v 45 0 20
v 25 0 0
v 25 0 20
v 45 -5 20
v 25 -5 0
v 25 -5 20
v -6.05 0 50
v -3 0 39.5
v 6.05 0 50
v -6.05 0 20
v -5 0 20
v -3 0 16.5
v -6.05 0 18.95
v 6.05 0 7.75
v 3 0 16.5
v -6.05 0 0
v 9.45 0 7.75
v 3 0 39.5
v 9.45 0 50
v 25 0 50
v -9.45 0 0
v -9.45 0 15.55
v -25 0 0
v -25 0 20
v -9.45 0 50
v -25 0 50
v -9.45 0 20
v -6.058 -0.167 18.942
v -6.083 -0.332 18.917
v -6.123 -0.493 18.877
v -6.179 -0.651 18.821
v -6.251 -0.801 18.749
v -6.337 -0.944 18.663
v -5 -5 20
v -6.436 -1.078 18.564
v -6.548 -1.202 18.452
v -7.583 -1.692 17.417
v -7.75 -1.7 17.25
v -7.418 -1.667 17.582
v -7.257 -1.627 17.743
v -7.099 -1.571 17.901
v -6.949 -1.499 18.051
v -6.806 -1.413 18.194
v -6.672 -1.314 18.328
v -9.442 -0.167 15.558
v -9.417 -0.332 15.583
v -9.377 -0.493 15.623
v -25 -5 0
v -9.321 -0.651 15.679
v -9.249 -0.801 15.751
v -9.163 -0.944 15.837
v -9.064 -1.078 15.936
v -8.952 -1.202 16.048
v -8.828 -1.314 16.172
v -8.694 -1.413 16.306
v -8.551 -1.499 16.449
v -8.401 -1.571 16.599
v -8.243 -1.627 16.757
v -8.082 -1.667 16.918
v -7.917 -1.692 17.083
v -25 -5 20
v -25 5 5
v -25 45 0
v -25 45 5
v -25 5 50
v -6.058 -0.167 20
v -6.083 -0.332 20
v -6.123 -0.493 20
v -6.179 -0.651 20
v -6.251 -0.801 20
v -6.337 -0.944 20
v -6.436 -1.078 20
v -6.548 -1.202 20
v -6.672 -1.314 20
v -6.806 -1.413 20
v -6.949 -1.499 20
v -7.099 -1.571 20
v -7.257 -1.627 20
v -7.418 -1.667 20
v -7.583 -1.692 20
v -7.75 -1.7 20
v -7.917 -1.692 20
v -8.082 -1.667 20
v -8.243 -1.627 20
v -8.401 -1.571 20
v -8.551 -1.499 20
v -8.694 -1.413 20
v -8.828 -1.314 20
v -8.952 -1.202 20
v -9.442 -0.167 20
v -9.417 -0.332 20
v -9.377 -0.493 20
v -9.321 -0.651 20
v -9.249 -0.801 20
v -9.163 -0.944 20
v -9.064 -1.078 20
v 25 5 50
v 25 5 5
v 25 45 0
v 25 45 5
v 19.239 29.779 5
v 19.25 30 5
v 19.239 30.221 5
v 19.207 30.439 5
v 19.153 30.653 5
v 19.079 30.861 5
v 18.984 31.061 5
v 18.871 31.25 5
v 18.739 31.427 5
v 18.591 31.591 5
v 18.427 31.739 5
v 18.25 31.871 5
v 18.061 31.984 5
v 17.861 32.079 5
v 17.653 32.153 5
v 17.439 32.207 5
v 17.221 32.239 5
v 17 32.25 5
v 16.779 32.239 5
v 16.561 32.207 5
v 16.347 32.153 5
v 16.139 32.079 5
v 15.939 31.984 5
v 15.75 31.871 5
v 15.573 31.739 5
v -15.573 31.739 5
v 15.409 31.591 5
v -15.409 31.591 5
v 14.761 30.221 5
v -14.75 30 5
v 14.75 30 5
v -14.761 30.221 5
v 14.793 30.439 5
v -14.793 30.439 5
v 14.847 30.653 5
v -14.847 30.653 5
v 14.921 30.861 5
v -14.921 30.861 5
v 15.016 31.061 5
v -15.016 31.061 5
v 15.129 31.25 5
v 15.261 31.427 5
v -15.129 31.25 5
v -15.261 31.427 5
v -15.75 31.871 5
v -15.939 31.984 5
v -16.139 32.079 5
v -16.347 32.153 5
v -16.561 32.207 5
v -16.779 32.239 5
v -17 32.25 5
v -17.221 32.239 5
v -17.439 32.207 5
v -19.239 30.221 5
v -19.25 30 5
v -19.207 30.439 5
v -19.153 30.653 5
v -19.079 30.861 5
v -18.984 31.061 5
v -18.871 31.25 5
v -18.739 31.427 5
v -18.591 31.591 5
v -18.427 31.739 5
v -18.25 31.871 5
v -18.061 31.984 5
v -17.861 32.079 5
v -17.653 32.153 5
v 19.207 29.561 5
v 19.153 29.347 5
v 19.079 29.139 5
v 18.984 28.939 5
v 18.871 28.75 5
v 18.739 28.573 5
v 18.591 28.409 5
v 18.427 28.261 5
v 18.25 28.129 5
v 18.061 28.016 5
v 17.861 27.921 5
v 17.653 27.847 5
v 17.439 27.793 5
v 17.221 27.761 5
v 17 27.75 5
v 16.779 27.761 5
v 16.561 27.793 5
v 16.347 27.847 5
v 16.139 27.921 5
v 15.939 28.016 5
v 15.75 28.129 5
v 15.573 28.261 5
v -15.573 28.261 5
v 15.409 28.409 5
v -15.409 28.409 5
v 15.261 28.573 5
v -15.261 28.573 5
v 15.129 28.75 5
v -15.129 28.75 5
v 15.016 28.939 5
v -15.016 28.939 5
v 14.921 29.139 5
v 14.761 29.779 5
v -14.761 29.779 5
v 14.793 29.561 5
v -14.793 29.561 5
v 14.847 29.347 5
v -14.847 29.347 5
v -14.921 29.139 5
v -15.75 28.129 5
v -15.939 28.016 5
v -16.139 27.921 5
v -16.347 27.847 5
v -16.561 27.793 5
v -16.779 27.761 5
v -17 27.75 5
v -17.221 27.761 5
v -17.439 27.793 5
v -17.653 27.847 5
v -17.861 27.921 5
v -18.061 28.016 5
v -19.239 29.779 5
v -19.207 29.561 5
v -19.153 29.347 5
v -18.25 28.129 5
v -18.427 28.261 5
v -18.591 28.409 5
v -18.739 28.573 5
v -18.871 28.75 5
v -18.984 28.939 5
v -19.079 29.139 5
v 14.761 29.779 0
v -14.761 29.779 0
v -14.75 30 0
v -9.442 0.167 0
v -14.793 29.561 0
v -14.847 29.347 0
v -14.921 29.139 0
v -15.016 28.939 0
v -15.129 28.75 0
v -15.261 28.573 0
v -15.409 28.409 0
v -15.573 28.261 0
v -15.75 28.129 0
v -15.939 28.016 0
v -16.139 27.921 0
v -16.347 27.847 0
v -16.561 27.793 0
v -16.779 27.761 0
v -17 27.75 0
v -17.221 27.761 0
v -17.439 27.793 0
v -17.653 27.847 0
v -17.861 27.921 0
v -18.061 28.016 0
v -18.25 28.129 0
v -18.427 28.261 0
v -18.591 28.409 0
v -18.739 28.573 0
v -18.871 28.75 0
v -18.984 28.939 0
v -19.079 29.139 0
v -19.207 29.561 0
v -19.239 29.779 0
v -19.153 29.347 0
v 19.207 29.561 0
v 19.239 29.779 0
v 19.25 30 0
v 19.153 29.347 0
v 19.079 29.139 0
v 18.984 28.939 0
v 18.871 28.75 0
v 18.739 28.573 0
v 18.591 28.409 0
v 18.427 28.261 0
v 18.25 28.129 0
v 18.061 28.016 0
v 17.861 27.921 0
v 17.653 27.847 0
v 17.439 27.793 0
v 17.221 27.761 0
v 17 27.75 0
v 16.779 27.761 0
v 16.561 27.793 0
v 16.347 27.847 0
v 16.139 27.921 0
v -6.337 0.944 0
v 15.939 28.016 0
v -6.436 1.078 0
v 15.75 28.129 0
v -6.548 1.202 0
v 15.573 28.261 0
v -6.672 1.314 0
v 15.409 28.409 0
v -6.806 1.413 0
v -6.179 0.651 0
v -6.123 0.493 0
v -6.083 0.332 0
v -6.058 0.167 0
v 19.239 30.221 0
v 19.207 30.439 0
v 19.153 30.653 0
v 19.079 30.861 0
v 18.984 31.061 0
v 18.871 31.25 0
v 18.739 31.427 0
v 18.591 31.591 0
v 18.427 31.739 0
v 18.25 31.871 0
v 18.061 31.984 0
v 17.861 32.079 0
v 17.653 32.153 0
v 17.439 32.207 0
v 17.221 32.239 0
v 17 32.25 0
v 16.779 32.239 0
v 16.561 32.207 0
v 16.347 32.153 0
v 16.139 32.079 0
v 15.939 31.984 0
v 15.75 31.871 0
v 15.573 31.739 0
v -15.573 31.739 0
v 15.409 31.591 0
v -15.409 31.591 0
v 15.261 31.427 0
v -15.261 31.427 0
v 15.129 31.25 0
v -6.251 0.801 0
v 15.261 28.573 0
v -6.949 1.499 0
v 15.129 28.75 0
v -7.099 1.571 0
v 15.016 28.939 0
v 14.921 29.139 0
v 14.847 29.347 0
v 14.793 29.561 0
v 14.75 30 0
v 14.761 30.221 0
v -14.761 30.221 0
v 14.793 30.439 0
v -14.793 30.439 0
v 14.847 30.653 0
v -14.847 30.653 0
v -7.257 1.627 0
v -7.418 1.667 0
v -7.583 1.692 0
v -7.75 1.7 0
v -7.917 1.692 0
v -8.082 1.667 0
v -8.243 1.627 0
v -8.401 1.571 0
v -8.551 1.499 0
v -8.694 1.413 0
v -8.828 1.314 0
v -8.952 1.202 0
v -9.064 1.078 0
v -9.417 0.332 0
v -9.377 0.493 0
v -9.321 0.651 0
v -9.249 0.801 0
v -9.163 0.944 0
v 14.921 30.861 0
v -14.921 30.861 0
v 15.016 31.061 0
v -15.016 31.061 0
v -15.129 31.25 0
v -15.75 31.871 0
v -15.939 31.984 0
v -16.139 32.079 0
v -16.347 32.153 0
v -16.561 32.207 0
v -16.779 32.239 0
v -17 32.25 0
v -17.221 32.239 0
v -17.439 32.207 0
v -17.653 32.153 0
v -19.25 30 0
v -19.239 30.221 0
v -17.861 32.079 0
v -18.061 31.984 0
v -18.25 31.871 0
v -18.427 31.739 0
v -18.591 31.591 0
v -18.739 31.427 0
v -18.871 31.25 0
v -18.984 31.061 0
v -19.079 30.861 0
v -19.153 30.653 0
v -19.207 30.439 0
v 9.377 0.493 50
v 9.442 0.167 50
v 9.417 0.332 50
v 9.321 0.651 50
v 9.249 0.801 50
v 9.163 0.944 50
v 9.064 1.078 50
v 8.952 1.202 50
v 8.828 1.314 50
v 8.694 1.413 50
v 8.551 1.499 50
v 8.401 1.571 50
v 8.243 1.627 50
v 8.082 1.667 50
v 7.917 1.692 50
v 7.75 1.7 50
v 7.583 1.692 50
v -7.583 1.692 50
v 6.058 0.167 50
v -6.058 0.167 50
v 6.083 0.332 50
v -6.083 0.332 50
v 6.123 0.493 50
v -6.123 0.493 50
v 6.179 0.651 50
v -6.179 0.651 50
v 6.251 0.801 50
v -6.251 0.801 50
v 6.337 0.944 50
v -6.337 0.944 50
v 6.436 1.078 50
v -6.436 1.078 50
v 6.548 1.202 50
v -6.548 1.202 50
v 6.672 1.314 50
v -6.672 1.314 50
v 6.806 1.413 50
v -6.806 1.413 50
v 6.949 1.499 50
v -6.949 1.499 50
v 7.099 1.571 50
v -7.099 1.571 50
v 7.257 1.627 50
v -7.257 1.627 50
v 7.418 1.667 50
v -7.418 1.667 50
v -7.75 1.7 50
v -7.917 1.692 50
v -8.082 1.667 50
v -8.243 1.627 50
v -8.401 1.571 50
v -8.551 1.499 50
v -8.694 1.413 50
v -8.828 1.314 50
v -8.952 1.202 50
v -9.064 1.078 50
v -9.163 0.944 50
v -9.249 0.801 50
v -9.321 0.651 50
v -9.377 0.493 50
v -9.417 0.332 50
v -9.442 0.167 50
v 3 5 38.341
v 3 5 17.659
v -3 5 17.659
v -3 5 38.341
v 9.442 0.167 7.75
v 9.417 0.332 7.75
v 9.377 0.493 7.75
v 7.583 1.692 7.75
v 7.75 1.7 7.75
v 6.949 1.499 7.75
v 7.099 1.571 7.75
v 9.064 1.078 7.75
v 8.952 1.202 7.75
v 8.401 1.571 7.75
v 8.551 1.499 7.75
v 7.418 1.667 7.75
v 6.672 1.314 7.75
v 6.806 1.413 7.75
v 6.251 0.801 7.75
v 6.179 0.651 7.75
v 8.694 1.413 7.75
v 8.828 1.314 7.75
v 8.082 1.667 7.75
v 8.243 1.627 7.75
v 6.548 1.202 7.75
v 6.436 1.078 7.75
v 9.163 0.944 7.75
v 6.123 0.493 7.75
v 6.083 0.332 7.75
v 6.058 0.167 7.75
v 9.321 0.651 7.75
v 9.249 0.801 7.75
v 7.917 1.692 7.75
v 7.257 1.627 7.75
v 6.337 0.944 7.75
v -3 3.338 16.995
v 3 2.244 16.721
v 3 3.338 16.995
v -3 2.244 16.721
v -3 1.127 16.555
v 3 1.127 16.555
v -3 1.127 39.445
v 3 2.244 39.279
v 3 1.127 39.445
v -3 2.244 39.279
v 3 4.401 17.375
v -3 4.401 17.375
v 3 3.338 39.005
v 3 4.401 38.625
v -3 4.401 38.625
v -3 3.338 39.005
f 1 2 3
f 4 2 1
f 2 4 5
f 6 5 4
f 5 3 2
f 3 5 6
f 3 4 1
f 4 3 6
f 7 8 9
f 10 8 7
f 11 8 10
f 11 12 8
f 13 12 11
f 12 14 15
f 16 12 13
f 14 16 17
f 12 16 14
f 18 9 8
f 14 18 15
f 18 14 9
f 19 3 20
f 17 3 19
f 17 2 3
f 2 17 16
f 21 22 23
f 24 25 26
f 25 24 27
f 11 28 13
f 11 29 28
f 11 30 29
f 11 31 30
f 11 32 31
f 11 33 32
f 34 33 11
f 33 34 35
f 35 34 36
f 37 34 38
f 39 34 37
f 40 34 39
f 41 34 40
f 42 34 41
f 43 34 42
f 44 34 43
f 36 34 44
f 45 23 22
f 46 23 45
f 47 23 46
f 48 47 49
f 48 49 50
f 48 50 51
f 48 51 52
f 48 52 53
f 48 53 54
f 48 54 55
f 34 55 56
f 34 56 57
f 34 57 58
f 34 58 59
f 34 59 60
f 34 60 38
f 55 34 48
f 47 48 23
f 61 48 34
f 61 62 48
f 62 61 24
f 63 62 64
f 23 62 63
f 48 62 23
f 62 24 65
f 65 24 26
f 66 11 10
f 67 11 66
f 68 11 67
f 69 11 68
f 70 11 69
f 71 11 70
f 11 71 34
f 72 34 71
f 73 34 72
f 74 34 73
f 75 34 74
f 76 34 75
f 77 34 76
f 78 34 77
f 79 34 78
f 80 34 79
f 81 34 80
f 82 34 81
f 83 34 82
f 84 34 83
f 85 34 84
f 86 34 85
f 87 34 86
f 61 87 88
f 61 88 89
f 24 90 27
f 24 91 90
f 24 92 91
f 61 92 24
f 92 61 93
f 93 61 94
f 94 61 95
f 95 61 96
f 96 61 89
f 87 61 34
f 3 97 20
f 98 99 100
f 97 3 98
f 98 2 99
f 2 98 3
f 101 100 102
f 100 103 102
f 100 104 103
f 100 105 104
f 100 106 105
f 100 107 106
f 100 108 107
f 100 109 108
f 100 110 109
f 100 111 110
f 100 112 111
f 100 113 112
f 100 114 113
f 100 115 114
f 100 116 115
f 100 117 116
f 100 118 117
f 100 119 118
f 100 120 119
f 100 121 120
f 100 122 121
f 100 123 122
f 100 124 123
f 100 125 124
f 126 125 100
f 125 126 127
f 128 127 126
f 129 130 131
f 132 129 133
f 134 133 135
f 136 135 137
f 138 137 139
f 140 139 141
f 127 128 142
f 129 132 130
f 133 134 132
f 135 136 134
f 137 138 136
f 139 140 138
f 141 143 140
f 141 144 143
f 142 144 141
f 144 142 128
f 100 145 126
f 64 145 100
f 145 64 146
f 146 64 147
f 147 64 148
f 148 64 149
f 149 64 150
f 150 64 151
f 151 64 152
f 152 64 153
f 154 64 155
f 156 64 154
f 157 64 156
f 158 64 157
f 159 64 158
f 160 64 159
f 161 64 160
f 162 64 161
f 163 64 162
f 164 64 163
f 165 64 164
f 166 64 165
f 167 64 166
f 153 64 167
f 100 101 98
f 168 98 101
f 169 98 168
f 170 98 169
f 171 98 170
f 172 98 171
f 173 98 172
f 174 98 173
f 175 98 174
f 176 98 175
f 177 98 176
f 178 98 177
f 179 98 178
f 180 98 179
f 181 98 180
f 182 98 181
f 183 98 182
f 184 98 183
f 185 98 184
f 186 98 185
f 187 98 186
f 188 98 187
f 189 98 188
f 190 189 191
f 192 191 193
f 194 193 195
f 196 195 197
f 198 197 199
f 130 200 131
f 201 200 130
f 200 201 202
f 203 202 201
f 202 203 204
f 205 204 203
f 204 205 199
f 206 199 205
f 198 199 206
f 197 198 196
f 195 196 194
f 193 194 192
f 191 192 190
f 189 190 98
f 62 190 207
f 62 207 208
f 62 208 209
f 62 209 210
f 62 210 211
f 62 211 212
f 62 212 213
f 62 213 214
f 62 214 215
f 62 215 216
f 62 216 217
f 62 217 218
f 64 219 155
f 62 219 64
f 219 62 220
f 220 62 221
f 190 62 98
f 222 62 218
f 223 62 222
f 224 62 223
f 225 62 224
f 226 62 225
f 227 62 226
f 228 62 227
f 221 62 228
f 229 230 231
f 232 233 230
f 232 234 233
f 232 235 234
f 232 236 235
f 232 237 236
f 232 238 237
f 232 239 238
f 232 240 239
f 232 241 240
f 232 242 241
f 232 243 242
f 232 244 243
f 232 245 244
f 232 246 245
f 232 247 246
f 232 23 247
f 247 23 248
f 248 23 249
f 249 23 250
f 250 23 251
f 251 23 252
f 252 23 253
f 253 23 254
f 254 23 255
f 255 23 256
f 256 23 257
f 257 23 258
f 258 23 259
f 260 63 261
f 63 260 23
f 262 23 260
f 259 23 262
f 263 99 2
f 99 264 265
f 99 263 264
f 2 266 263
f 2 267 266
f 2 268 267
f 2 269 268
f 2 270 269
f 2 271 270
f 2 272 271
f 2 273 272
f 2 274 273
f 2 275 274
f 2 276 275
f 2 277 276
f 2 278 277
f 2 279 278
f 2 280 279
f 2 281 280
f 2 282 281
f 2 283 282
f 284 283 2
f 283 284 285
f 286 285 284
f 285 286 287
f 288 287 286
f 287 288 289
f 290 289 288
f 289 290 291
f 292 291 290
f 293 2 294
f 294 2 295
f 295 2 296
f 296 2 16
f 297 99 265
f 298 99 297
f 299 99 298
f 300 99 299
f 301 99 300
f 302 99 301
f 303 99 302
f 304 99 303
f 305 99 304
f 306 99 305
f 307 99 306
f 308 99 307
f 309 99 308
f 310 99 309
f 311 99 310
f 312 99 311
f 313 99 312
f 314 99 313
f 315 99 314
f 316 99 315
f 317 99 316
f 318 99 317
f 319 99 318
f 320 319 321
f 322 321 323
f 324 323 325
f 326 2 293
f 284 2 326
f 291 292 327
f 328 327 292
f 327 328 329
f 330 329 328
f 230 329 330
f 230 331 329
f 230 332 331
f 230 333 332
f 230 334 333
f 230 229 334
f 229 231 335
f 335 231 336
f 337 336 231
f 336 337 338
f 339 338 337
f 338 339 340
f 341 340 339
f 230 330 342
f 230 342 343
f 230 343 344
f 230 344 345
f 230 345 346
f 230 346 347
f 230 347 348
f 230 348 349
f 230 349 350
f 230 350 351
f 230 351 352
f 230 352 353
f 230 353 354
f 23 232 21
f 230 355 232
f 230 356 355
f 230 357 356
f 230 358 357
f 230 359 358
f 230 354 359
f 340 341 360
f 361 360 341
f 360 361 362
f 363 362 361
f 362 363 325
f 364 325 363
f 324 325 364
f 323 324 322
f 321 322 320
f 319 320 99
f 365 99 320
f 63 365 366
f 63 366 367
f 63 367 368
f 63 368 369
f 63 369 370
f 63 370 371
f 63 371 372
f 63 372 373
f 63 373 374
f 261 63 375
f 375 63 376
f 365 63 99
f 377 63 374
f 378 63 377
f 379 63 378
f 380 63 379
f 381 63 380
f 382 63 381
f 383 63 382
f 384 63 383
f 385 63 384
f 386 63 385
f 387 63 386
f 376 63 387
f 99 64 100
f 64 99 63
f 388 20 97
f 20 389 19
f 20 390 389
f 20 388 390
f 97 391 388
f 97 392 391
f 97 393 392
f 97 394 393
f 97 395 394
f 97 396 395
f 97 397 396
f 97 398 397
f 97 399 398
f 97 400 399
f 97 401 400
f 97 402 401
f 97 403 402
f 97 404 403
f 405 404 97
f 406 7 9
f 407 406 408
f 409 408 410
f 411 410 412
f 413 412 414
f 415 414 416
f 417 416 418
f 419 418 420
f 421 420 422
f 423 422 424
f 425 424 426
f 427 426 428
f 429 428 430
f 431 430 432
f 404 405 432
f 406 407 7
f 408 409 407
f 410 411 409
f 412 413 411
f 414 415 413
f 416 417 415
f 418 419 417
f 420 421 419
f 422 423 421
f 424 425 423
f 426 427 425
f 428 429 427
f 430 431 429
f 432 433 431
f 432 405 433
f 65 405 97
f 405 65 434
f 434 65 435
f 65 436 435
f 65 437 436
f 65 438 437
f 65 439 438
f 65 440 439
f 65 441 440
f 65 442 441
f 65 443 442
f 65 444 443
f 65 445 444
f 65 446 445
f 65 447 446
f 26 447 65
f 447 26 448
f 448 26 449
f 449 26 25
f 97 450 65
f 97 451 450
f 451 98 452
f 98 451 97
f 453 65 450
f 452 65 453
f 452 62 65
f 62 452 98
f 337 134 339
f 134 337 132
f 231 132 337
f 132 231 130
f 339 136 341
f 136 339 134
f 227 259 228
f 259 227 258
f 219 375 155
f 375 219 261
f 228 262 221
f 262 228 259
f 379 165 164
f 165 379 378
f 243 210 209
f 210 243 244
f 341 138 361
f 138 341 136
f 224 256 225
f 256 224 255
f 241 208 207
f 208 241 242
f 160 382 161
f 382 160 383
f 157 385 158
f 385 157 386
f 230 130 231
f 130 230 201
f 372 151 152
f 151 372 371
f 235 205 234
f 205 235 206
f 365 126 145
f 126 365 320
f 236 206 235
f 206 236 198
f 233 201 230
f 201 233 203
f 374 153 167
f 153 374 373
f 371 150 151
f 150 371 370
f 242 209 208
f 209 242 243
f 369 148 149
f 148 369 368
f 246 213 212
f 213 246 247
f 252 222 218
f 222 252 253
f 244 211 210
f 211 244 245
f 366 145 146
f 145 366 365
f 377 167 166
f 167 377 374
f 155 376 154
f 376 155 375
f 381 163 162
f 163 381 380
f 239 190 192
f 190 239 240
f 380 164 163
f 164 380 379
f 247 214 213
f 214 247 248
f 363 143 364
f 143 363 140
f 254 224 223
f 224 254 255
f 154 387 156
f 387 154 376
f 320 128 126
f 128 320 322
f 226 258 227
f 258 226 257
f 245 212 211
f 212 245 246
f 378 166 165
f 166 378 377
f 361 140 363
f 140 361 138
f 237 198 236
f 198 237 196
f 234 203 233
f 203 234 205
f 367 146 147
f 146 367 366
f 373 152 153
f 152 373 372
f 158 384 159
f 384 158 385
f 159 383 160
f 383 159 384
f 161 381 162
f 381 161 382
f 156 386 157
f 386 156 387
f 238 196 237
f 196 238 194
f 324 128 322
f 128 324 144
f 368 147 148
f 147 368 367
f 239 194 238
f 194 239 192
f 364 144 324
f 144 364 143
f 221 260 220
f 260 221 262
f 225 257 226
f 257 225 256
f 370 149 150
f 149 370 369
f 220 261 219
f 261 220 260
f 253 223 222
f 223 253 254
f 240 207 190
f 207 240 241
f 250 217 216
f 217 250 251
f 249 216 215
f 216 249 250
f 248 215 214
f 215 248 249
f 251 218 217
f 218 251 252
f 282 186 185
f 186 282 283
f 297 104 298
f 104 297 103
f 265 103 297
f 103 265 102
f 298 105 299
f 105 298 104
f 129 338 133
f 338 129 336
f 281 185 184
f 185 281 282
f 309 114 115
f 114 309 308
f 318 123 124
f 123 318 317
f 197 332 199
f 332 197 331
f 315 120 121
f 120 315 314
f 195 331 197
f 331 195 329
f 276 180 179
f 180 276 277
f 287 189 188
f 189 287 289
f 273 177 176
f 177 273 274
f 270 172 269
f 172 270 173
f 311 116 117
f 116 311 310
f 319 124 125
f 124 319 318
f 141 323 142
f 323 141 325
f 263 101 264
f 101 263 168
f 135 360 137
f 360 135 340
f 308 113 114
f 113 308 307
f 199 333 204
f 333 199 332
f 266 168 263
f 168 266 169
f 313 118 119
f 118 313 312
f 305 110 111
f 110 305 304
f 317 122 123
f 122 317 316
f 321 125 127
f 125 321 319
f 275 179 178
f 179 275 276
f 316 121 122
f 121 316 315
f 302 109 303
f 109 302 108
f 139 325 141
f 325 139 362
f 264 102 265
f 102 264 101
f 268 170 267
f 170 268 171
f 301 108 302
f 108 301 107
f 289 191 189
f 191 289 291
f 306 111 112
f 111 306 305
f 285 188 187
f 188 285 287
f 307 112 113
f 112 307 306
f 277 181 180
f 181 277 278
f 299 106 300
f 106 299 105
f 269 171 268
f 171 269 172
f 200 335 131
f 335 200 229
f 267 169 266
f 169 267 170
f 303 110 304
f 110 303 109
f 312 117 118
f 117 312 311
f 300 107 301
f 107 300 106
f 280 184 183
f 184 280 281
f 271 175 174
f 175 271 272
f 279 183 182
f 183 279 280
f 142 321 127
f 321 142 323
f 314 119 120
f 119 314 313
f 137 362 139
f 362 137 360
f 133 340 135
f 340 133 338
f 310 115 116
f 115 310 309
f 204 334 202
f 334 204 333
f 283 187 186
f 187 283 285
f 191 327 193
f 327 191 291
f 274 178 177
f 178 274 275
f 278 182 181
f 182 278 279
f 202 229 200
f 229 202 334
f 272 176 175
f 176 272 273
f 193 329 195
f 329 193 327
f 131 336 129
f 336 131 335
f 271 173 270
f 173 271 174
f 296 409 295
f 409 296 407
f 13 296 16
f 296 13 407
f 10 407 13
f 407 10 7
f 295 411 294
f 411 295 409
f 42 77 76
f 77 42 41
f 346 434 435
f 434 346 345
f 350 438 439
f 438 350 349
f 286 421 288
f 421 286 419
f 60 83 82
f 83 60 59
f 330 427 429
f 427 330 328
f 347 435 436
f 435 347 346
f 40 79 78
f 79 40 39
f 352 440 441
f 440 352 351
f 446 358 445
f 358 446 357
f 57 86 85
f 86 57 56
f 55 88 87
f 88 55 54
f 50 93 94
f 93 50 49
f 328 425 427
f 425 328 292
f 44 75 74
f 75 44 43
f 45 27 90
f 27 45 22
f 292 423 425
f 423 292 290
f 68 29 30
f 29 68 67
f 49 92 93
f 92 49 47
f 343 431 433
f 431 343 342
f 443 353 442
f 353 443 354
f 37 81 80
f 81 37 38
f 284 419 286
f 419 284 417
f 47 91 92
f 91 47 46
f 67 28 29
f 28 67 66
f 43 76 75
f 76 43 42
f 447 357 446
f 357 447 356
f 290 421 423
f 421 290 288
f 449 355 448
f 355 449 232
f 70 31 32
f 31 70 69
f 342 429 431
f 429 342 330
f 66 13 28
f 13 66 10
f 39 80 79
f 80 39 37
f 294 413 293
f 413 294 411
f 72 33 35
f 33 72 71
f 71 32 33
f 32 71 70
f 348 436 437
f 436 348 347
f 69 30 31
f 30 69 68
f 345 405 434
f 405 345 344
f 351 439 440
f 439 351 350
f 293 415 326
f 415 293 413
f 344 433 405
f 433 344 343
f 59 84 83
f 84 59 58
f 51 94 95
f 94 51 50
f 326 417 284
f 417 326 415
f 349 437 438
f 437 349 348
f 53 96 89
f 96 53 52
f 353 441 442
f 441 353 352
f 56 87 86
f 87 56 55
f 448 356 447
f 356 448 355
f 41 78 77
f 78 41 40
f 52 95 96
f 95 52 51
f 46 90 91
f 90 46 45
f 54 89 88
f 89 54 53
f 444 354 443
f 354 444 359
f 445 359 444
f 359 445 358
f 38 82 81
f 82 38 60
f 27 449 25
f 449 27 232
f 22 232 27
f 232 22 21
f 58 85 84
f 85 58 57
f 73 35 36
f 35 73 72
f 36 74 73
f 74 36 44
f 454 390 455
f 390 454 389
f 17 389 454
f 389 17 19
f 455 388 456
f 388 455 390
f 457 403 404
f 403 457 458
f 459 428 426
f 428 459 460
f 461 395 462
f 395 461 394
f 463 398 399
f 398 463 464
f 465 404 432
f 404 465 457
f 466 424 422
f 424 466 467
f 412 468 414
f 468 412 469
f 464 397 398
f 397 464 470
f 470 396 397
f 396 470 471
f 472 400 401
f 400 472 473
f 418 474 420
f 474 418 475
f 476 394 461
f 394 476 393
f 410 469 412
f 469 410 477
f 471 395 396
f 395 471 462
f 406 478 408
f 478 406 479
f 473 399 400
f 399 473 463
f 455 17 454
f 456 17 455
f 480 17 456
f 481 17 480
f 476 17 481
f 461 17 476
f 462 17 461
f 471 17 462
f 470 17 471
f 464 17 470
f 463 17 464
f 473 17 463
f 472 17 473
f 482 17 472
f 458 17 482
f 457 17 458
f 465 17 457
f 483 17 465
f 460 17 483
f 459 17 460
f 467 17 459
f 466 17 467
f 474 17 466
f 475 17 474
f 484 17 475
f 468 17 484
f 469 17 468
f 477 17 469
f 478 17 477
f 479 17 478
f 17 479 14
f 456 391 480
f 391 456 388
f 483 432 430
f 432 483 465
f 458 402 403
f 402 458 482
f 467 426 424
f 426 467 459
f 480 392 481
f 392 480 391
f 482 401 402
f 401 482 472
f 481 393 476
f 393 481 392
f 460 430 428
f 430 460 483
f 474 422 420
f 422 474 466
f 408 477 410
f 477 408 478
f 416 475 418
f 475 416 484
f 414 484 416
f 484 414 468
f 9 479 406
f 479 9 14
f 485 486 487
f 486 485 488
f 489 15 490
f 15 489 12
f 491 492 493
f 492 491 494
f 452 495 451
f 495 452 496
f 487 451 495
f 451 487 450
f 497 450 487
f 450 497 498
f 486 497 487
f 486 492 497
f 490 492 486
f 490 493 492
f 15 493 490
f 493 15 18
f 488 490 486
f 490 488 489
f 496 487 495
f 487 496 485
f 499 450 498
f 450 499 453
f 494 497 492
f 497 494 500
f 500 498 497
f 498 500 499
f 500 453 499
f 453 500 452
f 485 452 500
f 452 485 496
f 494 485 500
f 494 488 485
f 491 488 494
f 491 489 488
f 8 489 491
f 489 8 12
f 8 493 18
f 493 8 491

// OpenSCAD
// L-shaped mounting bracket for NEMA 17 stepper motor (syringe pump)
// Print orientation: base plate on bed (z = 0), motor plate builds upward.

$fn = 64;

// ---- Base plate ----
base_x0 = -25;      // base plate x start
base_x1 = 25;       // base plate x end
base_y0 = 0;        // base plate y start
base_y1 = 45;       // base plate y end
base_z1 = 5;        // base plate top z
hole_d  = 4.5;      // M4 through-hole diameter
hole_x  = [-17, 17];// through-hole x positions
hole_y  = 30;       // through-hole y position

// ---- Motor plate ----
motor_x0 = -25;     // motor plate x start
motor_x1 = 25;      // motor plate x end
motor_y0 = 0;       // motor plate y start
motor_y1 = 5;       // motor plate top y
motor_z1 = 50;      // motor plate top z
boss_d   = 23;      // motor centring boss hole diameter
boss_x   = 0;       // boss hole x centre
boss_z   = 28;      // boss hole z centre
screw_d  = 3.4;     // M3 screw hole diameter
screw_n  = 4;       // number of screw holes
screw_p  = 31;      // square pattern side length

// ---- Gussets ----
gusset_t     = 5;   // gusset thickness (X)
gusset_leg   = 20;  // right triangle leg length (Y and Z)
gusset_x0    = -25; // left gusset x start
gusset_x2    = -20; // left gusset x end / right gusset x start
gusset_x3    = 25;  // right gusset x end

// ---- Misc ----
eps = 0.5;          // cutter overshoot past faces

difference() {
    union() {
        // Base plate
        translate([base_x0, base_y0, 0])
            cube([base_x1 - base_x0, base_y1 - base_y0, base_z1]);

        // Motor plate (overlaps base slightly for a clean union)
        translate([motor_x0, motor_y0, 0])
            cube([motor_x1 - motor_x0, motor_y1, motor_z1]);

        // Gussets, flush with left and right edges
        for (sx = [-1, 1])
            translate([sx * gusset_x0, 0, 0])
                rotate([90, 0, 0])
                    linear_extrude(height = gusset_t)
                        polygon([
                            [gusset_leg, gusset_leg],
                            [0, gusset_leg],
                            [0, 0]
                        ]);
    }

    // Base plate through-holes
    for (x = hole_x)
        translate([x, hole_y, -eps])
            cylinder(d = hole_d, h = base_z1 + 2 * eps);

    // Motor boss hole (along Y)
    translate([boss_x, 0, boss_z])
        rotate([0, 90, 0])
            cylinder(d = boss_d, h = motor_y1 + 2 * eps, center = true);

    // M3 screw holes on a square pattern centred on the boss
    for (i = [0 : screw_n - 1]) {
        x = (i % 2 - 0.5) * screw_p / 2;
        z = (i / 2 - 0.25) * screw_p;
        translate([x, 0, z])
            cylinder(d = screw_d, h = motor_z1 + 2 * eps);
    }
}
